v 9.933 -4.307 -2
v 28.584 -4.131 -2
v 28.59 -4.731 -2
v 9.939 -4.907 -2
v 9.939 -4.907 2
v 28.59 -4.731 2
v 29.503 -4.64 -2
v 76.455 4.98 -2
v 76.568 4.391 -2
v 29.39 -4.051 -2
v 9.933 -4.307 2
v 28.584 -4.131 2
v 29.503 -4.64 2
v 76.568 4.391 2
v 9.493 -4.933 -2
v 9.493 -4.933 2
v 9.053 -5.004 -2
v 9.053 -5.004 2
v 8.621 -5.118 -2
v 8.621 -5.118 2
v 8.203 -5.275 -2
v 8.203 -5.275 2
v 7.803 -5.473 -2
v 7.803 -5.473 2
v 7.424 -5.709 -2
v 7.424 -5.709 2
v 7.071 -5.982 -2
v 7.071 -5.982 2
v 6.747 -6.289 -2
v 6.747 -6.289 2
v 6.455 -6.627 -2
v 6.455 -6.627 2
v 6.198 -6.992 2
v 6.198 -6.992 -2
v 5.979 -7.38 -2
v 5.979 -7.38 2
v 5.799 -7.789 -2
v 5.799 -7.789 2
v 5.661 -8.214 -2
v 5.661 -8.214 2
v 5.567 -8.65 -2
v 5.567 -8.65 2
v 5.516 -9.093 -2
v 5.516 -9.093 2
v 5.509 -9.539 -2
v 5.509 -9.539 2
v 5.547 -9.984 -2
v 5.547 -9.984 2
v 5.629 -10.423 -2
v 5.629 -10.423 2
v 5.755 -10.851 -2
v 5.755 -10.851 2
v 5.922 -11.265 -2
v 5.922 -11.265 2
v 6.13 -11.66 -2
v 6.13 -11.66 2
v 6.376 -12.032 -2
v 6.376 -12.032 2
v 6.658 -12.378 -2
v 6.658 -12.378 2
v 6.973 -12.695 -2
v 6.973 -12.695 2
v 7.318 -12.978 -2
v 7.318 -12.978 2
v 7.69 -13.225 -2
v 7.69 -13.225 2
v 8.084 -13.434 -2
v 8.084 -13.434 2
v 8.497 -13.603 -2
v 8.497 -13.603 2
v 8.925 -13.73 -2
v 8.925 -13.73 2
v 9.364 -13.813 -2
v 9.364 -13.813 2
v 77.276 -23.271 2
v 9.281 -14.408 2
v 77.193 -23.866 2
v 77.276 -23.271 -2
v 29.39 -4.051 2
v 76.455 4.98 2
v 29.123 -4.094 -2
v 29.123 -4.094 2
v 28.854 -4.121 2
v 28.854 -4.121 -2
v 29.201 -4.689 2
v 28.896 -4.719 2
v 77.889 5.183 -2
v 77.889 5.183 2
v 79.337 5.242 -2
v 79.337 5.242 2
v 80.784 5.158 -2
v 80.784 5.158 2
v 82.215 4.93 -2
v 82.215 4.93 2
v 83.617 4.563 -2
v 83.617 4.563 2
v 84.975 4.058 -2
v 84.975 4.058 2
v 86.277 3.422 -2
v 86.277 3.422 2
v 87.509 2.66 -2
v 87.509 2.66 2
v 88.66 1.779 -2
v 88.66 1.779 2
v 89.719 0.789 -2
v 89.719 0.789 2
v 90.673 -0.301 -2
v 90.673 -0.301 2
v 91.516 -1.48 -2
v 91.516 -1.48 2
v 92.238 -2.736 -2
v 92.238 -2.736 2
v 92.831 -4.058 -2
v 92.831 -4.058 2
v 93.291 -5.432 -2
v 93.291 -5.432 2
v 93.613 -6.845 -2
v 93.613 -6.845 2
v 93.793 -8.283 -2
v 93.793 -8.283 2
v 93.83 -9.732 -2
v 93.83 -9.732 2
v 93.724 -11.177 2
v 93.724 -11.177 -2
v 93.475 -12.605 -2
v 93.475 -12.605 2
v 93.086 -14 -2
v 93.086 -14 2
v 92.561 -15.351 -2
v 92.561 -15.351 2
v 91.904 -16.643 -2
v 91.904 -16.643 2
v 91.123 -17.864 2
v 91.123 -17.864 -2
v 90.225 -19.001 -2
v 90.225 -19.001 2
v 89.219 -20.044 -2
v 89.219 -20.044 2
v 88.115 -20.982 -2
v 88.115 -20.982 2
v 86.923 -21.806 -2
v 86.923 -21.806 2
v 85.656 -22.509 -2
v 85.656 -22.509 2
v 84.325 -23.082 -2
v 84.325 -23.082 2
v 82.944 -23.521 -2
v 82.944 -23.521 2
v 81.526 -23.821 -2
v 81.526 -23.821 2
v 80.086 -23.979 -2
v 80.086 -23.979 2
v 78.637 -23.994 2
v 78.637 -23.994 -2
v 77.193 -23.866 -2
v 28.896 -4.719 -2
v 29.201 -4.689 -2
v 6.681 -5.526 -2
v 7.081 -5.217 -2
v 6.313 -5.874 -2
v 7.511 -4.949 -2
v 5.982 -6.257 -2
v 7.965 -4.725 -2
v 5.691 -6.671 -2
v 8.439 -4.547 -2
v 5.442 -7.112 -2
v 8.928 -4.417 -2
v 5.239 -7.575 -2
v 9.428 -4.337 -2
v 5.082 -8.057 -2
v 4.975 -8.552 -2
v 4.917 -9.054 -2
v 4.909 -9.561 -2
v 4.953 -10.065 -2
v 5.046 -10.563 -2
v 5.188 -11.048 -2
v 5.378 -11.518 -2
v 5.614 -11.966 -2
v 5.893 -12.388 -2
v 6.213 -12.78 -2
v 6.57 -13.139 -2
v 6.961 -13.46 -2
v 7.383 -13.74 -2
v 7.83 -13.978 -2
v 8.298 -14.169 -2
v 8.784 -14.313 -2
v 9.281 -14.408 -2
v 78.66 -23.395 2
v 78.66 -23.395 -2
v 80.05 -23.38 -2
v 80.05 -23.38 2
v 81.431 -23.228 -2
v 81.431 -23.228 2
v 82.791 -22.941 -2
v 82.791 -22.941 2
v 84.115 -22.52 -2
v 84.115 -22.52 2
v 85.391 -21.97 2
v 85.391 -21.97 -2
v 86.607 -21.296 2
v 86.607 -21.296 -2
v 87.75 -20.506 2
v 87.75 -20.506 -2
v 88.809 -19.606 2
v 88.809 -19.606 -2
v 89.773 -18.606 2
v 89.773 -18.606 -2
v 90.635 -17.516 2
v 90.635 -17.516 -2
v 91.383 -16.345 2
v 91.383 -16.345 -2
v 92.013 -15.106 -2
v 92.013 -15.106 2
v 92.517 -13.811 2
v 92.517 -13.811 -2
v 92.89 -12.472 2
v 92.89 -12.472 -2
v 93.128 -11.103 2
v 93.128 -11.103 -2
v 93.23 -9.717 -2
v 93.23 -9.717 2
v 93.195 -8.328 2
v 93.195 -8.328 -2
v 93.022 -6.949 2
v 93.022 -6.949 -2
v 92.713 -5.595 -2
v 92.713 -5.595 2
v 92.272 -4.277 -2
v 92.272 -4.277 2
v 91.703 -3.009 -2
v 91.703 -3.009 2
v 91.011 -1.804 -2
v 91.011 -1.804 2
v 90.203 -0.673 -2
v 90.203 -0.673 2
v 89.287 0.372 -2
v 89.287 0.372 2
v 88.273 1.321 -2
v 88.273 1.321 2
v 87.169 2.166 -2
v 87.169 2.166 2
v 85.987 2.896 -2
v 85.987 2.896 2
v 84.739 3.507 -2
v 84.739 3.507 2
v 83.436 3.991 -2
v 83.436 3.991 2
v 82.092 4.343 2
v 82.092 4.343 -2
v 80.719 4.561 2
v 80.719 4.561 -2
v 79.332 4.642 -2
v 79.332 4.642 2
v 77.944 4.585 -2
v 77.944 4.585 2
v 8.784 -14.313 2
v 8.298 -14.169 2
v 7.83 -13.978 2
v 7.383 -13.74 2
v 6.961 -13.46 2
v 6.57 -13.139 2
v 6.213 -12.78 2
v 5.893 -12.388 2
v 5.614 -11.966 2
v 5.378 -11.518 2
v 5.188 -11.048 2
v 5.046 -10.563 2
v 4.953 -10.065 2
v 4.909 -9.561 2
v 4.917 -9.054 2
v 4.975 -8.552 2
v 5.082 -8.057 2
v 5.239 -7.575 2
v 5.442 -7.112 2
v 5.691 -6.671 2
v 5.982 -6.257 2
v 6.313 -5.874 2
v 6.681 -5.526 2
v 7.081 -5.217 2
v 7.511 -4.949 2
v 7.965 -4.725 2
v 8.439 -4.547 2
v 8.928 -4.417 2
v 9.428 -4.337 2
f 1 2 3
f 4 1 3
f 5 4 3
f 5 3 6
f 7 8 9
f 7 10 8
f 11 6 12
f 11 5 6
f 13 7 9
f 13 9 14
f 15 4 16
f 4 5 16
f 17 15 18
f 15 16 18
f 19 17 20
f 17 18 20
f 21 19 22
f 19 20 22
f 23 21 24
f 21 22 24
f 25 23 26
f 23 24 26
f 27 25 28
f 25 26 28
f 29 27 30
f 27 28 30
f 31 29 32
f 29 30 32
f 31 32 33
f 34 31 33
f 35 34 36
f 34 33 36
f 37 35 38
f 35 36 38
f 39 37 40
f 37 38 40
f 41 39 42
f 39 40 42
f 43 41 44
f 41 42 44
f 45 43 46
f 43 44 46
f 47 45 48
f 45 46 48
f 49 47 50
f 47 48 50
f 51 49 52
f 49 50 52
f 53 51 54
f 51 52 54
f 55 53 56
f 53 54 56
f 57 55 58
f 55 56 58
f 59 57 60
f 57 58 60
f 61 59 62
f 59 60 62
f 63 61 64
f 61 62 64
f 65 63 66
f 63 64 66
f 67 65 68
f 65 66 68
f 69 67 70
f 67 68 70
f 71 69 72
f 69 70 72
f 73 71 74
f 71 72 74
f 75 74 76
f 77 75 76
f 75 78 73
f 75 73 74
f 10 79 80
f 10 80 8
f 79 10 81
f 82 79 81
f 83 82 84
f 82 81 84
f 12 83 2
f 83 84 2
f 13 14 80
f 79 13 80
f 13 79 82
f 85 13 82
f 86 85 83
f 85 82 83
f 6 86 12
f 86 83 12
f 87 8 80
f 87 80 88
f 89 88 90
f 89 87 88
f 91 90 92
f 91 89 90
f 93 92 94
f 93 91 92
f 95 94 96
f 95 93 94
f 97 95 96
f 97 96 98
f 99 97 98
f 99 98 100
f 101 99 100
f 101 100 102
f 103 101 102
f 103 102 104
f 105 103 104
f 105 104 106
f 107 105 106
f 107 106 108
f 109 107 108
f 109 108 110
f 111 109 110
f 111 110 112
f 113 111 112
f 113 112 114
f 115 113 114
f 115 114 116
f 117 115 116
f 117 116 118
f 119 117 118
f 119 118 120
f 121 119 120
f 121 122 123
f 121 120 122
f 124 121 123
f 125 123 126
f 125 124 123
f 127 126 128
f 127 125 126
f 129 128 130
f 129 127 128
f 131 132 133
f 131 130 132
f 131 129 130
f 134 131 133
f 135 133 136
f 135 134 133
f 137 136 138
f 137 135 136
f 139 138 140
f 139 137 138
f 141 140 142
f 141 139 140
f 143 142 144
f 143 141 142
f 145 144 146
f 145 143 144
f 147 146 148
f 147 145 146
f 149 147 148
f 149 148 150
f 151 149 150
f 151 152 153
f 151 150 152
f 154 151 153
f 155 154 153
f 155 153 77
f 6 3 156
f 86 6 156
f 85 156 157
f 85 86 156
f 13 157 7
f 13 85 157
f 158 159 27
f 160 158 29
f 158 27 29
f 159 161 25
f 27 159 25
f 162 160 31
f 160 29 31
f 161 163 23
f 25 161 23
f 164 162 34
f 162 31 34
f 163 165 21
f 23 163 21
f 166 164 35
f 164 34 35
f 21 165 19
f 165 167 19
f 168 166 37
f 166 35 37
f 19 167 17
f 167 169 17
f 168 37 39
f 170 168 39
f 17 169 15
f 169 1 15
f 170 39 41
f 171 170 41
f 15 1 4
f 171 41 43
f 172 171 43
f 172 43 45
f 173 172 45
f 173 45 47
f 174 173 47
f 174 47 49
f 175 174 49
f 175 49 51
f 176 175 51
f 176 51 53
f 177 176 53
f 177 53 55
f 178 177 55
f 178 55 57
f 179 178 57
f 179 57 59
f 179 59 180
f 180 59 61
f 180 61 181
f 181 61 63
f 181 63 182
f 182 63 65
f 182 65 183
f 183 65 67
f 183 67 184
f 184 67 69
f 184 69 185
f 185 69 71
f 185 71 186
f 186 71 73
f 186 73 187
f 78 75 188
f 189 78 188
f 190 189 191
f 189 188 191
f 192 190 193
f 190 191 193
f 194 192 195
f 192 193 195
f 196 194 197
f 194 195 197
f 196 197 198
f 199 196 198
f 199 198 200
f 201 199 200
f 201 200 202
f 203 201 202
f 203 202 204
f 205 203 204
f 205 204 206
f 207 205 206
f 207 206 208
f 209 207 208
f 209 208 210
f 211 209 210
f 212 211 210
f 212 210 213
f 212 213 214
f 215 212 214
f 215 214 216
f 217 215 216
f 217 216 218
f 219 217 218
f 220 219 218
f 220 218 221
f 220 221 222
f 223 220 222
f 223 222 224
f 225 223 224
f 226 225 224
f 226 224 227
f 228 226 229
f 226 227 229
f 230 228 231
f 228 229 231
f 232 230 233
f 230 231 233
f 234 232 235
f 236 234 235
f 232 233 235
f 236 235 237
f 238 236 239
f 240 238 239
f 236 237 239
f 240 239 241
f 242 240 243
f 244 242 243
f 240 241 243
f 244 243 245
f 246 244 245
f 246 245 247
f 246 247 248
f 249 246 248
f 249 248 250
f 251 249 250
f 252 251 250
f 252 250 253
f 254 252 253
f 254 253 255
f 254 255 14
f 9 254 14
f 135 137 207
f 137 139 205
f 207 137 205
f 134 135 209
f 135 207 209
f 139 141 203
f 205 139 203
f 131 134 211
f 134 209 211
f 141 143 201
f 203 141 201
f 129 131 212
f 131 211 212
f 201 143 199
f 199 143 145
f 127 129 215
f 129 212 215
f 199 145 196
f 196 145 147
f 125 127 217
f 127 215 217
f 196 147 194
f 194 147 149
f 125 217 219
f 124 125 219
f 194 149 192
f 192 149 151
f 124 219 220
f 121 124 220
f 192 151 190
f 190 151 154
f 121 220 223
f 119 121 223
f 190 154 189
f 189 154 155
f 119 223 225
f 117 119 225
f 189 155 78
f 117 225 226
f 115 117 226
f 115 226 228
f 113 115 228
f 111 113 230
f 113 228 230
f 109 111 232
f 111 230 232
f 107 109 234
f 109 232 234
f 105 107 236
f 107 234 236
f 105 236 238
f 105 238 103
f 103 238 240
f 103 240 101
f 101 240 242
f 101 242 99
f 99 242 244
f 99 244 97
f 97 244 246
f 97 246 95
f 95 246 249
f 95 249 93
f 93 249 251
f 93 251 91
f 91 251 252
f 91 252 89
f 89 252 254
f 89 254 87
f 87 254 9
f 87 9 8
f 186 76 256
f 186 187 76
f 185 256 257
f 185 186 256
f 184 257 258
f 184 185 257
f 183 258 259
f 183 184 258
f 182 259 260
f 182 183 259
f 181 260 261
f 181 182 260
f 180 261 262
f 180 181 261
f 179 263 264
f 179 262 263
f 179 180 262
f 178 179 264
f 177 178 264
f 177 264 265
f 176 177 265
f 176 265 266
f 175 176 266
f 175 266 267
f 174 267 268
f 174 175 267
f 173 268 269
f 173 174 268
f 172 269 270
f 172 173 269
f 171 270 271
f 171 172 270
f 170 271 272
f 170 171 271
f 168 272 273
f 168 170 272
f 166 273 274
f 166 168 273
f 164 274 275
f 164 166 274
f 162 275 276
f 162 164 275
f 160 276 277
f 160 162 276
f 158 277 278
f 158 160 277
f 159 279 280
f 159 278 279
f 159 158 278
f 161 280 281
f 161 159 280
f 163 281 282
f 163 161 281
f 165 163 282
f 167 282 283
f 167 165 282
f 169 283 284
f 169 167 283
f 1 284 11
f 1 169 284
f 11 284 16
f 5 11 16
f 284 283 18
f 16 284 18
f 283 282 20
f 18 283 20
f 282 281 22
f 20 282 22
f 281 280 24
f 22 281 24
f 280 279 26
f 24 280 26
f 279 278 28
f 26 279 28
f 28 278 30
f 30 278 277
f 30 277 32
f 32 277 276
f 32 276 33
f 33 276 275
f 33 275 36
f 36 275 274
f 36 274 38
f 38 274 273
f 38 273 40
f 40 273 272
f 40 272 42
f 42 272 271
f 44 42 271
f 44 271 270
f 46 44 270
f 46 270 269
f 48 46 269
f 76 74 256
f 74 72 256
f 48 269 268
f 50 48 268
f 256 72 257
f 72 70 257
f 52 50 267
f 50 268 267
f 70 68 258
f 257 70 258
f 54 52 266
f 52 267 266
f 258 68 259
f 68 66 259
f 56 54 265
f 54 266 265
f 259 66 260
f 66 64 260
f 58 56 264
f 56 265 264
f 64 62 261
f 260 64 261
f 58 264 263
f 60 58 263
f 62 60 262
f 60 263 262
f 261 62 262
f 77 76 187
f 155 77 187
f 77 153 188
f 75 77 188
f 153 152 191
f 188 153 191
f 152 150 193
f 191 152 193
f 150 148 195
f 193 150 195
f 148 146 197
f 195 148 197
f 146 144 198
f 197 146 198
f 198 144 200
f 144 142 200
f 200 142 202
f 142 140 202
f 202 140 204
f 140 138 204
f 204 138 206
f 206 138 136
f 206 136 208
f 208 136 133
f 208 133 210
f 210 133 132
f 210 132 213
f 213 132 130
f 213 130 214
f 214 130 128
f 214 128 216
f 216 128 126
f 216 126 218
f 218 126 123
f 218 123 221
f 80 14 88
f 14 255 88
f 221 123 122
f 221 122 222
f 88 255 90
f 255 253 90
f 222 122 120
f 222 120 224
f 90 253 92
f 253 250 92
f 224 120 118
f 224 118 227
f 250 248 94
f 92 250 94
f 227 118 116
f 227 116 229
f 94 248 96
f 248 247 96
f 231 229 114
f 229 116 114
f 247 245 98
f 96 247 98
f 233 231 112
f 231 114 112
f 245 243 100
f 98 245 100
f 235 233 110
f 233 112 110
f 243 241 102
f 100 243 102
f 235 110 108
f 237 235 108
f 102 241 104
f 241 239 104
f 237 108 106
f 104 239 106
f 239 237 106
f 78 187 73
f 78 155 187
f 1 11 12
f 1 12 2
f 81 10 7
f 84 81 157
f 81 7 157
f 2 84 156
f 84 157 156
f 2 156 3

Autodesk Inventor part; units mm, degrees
sketch "Sketch Path" plane through (0, 0, 0) normal (0, 0, 1) x (1, 0, 0)
  arc A0 (9.936, -4.607) -> (9.3224, -14.1105) centre (9.981, -9.3815) ccw
  arc A1 (28.5872, -4.4313) -> (29.4465, -4.3455) centre (28.542, 0.3685) ccw
  arc A2 (77.2347, -23.5685) -> (76.5111, 4.6858) centre (79.2105, -9.3815) ccw
  line L0 (77.2347, -23.5685) -> (9.3224, -14.1105)
  line L1 (9.936, -4.607) -> (28.5872, -4.4313)
  line L2 (29.4465, -4.3455) -> (76.5111, 4.6858)
ref_plane "Cross Section Plane" through (9.3224, -14.1105, 0) normal (0.9904, -0.1379, 0) x (0, 0, 1)
ref_plane "Work Plane2" through (9.981, -9.3815, 0) normal (-1, 0, 0) x (0, 0, 1)
ref_plane "Work Plane3" through (79.2105, -9.3815, 0) normal (-0.9998, -0.0189, 0) x (0, 0, 1)
sketch "Cross Section" plane through (9.3224, -14.1105, 0) normal (0.9904, -0.1379, 0) x (0, 0, 1)
  line L0 (-2, 0.3) -> (2, 0.3)
  line L1 (2, 0.3) -> (2, -0.3)
  line L2 (2, -0.3) -> (-2, -0.3)
  line L3 (-2, -0.3) -> (-2, 0.3)
  line L4 (-2, 0) -> (2, 0) construction
  point P0 (0, 0)
  point P1 (0, 0)
  dimension "d0" = 4
  dimension "d4" = 0.3
  dimension "d5" = 0.3
sweep "Belt" add profiles "Cross Section" path "Sketch Path"
equation "\"d0\" = da_B"
equation "\"d4\" = da_a"
equation "\"d5\" = da_a2"
equation "\"da_B\" = 4"
equation "\"da_pb\" = 2.5"
equation "\"da_a\" = 0.3"
equation "\"da_S\" = 1.5"
equation "\"da_Beta\" = 20deg"
equation "\"da_Ht\" = 0.7"
equation "\"da_H\" = 1.3"
equation "\"da_a2\" = 0.3"
properties part number "Synchronous Belt" material "Rubber"
